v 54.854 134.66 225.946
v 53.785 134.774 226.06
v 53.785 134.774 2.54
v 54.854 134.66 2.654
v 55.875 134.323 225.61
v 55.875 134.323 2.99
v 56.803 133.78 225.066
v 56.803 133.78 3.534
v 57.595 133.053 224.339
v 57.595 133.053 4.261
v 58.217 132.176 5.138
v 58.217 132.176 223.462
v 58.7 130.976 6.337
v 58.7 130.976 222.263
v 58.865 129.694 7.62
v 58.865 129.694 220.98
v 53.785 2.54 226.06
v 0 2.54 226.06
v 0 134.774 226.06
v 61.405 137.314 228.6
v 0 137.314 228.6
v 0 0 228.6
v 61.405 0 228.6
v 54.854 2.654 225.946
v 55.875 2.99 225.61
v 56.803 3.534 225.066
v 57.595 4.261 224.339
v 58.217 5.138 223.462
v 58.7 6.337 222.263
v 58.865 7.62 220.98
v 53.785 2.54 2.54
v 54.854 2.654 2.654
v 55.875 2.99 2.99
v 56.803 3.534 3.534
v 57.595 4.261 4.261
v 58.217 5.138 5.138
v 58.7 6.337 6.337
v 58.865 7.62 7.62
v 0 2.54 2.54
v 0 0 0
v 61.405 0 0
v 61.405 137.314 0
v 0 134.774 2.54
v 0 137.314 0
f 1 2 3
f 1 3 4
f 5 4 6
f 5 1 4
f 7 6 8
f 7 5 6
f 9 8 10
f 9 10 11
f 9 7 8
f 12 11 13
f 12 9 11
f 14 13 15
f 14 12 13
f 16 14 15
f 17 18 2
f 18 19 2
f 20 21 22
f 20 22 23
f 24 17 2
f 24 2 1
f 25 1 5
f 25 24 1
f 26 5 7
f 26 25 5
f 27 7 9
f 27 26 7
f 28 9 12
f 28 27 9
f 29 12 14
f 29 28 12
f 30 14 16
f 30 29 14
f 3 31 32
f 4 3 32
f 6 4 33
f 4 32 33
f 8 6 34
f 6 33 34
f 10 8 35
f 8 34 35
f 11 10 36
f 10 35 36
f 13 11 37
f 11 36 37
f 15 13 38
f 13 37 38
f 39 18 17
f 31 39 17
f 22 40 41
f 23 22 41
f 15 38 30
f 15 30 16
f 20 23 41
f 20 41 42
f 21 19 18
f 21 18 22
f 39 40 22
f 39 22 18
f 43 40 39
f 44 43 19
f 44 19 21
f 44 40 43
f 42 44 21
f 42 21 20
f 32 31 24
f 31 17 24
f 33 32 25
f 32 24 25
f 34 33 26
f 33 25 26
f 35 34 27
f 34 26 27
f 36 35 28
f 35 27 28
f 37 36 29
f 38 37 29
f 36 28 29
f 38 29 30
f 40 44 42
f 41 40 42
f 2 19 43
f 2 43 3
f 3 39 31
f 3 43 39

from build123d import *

# Parameters (mm, degrees)
F0_W     = 61.4049248397
F0_H     = 137.3135596514
F1_DEPTH = 228.6
F2_T     = -2.54
F7_R     = 5.08


# Not quite as in the source:
# - the program builds the solid bodies; features that only make, move or delete a surface that nothing else refers to are left out


with BuildPart() as f1:
    # F0 (on Top) → F1 (new body)
    with BuildSketch(Plane.XY):
        with Locations((30.7024624199, 68.6567798257)):
            Rectangle(F0_W, F0_H)
    extrude(amount=F1_DEPTH)

    # F2
    f2_openings = [f1.faces().sort_by_distance(p)[0] for p in [
        (0, 68.65678, 114.3),
    ]]
    offset(amount=F2_T, openings=f2_openings)

    # F7
    f7_edges = [f1.edges().sort_by_distance(p)[0] for p in [
        (58.864925, 134.77356, 114.3),
        (58.864925, 68.65678, 2.54),
        (58.864925, 2.54, 114.3),
        (58.864925, 68.65678, 226.06),
    ]]
    fillet(f7_edges, radius=F7_R)


solid = f1.part
